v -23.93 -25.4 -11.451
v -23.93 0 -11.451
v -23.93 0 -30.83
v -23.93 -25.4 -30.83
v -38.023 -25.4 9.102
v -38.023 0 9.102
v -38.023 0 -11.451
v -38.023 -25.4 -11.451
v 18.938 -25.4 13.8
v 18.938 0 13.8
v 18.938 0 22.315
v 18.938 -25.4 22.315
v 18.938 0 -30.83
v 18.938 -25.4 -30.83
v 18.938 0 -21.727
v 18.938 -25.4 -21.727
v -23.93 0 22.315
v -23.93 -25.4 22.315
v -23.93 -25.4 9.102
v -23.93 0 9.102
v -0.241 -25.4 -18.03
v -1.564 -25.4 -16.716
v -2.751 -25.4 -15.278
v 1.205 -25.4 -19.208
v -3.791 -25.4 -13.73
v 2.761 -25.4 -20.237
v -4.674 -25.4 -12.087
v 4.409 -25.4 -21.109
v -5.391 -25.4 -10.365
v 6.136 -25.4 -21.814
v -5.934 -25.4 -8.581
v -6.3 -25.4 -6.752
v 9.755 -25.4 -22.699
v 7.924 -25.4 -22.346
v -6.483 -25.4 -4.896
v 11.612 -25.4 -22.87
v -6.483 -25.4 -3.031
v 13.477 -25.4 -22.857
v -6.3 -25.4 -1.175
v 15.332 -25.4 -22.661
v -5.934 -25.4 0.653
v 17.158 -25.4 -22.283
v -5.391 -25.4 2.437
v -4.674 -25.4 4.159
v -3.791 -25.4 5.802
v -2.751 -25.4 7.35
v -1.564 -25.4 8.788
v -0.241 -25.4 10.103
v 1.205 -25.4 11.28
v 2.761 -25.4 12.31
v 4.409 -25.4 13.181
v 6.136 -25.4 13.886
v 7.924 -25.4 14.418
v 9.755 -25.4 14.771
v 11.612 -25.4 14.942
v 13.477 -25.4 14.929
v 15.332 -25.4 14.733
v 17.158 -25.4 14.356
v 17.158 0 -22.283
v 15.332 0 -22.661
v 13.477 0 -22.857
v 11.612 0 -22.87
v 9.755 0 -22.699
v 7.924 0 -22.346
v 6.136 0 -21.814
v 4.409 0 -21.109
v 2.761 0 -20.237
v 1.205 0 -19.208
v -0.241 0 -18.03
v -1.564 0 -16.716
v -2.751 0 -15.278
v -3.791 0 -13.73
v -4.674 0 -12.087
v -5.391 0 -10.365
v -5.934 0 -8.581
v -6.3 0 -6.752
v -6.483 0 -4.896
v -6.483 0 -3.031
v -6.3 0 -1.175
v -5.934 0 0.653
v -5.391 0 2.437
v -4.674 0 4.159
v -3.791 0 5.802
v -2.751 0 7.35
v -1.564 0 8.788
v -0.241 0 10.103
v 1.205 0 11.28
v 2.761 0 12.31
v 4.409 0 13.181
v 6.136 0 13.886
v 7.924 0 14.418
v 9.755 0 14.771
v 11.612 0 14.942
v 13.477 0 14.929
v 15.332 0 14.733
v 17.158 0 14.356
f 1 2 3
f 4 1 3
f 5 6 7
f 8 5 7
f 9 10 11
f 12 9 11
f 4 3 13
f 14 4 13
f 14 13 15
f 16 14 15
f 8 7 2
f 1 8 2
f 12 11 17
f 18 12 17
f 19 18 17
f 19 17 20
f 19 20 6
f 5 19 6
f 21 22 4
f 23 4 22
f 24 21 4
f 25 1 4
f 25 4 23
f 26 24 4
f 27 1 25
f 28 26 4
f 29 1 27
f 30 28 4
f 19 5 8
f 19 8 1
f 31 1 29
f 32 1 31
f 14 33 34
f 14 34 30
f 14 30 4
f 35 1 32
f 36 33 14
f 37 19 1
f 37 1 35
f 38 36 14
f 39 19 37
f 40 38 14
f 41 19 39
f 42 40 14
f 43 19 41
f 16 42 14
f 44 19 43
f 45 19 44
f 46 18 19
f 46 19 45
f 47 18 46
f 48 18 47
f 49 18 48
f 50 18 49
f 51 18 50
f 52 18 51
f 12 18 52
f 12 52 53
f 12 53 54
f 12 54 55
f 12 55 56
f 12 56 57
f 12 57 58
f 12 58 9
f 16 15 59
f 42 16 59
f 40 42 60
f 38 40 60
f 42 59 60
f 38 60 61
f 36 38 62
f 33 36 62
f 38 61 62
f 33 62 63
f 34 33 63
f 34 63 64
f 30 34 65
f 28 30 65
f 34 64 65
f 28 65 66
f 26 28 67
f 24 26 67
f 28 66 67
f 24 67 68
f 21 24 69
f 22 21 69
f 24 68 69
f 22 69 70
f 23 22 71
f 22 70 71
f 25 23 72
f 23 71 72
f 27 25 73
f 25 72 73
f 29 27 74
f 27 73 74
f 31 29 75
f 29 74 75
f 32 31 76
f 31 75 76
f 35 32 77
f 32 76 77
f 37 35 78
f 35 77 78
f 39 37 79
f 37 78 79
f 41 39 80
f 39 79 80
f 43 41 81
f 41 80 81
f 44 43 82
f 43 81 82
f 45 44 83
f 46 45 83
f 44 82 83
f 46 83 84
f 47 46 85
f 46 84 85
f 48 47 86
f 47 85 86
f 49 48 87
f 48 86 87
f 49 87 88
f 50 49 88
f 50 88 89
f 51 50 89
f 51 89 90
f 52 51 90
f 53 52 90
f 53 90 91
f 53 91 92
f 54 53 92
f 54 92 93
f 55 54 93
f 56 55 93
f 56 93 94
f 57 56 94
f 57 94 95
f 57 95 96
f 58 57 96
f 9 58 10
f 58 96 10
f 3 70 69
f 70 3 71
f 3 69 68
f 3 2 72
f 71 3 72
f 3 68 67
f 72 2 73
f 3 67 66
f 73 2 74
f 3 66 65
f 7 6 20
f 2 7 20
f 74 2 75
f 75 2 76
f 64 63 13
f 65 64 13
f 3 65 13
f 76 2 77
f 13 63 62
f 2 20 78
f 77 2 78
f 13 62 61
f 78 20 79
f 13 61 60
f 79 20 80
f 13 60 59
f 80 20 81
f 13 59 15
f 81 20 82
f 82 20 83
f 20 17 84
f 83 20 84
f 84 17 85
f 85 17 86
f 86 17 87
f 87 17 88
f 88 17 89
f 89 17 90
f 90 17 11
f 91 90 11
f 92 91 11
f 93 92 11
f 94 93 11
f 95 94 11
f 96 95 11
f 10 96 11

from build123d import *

# Parameters (mm, degrees)
F1_DEPTH = 25.4


with BuildPart() as f1:
    # F0 (on Front) → F1 (new body)
    with BuildSketch(Plane.XZ):
        with BuildLine():
            Line((-23.929596, -11.450972), (-23.929596, -30.829543))
            Line((-23.929596, -30.829543), (18.938147, -30.829543))
            Line((18.938147, -30.829543), (18.938147, -21.727486))
            ThreePointArc((18.938147, -21.727486), (-6.506098, -3.963798), (18.938147, 13.79989))
            Line((18.938147, 13.79989), (18.938147, 22.314714))
            Line((18.938147, 22.314714), (-23.929596, 22.314714))
            Line((-23.929596, 22.314714), (-23.929596, 9.102055))
            Line((-23.929596, 9.102055), (-38.023103, 9.102055))
            Line((-38.023103, 9.102055), (-38.023103, -11.450972))
            Line((-38.023103, -11.450972), (-23.929596, -11.450972))
        make_face()
    extrude(amount=F1_DEPTH)


solid = f1.part
